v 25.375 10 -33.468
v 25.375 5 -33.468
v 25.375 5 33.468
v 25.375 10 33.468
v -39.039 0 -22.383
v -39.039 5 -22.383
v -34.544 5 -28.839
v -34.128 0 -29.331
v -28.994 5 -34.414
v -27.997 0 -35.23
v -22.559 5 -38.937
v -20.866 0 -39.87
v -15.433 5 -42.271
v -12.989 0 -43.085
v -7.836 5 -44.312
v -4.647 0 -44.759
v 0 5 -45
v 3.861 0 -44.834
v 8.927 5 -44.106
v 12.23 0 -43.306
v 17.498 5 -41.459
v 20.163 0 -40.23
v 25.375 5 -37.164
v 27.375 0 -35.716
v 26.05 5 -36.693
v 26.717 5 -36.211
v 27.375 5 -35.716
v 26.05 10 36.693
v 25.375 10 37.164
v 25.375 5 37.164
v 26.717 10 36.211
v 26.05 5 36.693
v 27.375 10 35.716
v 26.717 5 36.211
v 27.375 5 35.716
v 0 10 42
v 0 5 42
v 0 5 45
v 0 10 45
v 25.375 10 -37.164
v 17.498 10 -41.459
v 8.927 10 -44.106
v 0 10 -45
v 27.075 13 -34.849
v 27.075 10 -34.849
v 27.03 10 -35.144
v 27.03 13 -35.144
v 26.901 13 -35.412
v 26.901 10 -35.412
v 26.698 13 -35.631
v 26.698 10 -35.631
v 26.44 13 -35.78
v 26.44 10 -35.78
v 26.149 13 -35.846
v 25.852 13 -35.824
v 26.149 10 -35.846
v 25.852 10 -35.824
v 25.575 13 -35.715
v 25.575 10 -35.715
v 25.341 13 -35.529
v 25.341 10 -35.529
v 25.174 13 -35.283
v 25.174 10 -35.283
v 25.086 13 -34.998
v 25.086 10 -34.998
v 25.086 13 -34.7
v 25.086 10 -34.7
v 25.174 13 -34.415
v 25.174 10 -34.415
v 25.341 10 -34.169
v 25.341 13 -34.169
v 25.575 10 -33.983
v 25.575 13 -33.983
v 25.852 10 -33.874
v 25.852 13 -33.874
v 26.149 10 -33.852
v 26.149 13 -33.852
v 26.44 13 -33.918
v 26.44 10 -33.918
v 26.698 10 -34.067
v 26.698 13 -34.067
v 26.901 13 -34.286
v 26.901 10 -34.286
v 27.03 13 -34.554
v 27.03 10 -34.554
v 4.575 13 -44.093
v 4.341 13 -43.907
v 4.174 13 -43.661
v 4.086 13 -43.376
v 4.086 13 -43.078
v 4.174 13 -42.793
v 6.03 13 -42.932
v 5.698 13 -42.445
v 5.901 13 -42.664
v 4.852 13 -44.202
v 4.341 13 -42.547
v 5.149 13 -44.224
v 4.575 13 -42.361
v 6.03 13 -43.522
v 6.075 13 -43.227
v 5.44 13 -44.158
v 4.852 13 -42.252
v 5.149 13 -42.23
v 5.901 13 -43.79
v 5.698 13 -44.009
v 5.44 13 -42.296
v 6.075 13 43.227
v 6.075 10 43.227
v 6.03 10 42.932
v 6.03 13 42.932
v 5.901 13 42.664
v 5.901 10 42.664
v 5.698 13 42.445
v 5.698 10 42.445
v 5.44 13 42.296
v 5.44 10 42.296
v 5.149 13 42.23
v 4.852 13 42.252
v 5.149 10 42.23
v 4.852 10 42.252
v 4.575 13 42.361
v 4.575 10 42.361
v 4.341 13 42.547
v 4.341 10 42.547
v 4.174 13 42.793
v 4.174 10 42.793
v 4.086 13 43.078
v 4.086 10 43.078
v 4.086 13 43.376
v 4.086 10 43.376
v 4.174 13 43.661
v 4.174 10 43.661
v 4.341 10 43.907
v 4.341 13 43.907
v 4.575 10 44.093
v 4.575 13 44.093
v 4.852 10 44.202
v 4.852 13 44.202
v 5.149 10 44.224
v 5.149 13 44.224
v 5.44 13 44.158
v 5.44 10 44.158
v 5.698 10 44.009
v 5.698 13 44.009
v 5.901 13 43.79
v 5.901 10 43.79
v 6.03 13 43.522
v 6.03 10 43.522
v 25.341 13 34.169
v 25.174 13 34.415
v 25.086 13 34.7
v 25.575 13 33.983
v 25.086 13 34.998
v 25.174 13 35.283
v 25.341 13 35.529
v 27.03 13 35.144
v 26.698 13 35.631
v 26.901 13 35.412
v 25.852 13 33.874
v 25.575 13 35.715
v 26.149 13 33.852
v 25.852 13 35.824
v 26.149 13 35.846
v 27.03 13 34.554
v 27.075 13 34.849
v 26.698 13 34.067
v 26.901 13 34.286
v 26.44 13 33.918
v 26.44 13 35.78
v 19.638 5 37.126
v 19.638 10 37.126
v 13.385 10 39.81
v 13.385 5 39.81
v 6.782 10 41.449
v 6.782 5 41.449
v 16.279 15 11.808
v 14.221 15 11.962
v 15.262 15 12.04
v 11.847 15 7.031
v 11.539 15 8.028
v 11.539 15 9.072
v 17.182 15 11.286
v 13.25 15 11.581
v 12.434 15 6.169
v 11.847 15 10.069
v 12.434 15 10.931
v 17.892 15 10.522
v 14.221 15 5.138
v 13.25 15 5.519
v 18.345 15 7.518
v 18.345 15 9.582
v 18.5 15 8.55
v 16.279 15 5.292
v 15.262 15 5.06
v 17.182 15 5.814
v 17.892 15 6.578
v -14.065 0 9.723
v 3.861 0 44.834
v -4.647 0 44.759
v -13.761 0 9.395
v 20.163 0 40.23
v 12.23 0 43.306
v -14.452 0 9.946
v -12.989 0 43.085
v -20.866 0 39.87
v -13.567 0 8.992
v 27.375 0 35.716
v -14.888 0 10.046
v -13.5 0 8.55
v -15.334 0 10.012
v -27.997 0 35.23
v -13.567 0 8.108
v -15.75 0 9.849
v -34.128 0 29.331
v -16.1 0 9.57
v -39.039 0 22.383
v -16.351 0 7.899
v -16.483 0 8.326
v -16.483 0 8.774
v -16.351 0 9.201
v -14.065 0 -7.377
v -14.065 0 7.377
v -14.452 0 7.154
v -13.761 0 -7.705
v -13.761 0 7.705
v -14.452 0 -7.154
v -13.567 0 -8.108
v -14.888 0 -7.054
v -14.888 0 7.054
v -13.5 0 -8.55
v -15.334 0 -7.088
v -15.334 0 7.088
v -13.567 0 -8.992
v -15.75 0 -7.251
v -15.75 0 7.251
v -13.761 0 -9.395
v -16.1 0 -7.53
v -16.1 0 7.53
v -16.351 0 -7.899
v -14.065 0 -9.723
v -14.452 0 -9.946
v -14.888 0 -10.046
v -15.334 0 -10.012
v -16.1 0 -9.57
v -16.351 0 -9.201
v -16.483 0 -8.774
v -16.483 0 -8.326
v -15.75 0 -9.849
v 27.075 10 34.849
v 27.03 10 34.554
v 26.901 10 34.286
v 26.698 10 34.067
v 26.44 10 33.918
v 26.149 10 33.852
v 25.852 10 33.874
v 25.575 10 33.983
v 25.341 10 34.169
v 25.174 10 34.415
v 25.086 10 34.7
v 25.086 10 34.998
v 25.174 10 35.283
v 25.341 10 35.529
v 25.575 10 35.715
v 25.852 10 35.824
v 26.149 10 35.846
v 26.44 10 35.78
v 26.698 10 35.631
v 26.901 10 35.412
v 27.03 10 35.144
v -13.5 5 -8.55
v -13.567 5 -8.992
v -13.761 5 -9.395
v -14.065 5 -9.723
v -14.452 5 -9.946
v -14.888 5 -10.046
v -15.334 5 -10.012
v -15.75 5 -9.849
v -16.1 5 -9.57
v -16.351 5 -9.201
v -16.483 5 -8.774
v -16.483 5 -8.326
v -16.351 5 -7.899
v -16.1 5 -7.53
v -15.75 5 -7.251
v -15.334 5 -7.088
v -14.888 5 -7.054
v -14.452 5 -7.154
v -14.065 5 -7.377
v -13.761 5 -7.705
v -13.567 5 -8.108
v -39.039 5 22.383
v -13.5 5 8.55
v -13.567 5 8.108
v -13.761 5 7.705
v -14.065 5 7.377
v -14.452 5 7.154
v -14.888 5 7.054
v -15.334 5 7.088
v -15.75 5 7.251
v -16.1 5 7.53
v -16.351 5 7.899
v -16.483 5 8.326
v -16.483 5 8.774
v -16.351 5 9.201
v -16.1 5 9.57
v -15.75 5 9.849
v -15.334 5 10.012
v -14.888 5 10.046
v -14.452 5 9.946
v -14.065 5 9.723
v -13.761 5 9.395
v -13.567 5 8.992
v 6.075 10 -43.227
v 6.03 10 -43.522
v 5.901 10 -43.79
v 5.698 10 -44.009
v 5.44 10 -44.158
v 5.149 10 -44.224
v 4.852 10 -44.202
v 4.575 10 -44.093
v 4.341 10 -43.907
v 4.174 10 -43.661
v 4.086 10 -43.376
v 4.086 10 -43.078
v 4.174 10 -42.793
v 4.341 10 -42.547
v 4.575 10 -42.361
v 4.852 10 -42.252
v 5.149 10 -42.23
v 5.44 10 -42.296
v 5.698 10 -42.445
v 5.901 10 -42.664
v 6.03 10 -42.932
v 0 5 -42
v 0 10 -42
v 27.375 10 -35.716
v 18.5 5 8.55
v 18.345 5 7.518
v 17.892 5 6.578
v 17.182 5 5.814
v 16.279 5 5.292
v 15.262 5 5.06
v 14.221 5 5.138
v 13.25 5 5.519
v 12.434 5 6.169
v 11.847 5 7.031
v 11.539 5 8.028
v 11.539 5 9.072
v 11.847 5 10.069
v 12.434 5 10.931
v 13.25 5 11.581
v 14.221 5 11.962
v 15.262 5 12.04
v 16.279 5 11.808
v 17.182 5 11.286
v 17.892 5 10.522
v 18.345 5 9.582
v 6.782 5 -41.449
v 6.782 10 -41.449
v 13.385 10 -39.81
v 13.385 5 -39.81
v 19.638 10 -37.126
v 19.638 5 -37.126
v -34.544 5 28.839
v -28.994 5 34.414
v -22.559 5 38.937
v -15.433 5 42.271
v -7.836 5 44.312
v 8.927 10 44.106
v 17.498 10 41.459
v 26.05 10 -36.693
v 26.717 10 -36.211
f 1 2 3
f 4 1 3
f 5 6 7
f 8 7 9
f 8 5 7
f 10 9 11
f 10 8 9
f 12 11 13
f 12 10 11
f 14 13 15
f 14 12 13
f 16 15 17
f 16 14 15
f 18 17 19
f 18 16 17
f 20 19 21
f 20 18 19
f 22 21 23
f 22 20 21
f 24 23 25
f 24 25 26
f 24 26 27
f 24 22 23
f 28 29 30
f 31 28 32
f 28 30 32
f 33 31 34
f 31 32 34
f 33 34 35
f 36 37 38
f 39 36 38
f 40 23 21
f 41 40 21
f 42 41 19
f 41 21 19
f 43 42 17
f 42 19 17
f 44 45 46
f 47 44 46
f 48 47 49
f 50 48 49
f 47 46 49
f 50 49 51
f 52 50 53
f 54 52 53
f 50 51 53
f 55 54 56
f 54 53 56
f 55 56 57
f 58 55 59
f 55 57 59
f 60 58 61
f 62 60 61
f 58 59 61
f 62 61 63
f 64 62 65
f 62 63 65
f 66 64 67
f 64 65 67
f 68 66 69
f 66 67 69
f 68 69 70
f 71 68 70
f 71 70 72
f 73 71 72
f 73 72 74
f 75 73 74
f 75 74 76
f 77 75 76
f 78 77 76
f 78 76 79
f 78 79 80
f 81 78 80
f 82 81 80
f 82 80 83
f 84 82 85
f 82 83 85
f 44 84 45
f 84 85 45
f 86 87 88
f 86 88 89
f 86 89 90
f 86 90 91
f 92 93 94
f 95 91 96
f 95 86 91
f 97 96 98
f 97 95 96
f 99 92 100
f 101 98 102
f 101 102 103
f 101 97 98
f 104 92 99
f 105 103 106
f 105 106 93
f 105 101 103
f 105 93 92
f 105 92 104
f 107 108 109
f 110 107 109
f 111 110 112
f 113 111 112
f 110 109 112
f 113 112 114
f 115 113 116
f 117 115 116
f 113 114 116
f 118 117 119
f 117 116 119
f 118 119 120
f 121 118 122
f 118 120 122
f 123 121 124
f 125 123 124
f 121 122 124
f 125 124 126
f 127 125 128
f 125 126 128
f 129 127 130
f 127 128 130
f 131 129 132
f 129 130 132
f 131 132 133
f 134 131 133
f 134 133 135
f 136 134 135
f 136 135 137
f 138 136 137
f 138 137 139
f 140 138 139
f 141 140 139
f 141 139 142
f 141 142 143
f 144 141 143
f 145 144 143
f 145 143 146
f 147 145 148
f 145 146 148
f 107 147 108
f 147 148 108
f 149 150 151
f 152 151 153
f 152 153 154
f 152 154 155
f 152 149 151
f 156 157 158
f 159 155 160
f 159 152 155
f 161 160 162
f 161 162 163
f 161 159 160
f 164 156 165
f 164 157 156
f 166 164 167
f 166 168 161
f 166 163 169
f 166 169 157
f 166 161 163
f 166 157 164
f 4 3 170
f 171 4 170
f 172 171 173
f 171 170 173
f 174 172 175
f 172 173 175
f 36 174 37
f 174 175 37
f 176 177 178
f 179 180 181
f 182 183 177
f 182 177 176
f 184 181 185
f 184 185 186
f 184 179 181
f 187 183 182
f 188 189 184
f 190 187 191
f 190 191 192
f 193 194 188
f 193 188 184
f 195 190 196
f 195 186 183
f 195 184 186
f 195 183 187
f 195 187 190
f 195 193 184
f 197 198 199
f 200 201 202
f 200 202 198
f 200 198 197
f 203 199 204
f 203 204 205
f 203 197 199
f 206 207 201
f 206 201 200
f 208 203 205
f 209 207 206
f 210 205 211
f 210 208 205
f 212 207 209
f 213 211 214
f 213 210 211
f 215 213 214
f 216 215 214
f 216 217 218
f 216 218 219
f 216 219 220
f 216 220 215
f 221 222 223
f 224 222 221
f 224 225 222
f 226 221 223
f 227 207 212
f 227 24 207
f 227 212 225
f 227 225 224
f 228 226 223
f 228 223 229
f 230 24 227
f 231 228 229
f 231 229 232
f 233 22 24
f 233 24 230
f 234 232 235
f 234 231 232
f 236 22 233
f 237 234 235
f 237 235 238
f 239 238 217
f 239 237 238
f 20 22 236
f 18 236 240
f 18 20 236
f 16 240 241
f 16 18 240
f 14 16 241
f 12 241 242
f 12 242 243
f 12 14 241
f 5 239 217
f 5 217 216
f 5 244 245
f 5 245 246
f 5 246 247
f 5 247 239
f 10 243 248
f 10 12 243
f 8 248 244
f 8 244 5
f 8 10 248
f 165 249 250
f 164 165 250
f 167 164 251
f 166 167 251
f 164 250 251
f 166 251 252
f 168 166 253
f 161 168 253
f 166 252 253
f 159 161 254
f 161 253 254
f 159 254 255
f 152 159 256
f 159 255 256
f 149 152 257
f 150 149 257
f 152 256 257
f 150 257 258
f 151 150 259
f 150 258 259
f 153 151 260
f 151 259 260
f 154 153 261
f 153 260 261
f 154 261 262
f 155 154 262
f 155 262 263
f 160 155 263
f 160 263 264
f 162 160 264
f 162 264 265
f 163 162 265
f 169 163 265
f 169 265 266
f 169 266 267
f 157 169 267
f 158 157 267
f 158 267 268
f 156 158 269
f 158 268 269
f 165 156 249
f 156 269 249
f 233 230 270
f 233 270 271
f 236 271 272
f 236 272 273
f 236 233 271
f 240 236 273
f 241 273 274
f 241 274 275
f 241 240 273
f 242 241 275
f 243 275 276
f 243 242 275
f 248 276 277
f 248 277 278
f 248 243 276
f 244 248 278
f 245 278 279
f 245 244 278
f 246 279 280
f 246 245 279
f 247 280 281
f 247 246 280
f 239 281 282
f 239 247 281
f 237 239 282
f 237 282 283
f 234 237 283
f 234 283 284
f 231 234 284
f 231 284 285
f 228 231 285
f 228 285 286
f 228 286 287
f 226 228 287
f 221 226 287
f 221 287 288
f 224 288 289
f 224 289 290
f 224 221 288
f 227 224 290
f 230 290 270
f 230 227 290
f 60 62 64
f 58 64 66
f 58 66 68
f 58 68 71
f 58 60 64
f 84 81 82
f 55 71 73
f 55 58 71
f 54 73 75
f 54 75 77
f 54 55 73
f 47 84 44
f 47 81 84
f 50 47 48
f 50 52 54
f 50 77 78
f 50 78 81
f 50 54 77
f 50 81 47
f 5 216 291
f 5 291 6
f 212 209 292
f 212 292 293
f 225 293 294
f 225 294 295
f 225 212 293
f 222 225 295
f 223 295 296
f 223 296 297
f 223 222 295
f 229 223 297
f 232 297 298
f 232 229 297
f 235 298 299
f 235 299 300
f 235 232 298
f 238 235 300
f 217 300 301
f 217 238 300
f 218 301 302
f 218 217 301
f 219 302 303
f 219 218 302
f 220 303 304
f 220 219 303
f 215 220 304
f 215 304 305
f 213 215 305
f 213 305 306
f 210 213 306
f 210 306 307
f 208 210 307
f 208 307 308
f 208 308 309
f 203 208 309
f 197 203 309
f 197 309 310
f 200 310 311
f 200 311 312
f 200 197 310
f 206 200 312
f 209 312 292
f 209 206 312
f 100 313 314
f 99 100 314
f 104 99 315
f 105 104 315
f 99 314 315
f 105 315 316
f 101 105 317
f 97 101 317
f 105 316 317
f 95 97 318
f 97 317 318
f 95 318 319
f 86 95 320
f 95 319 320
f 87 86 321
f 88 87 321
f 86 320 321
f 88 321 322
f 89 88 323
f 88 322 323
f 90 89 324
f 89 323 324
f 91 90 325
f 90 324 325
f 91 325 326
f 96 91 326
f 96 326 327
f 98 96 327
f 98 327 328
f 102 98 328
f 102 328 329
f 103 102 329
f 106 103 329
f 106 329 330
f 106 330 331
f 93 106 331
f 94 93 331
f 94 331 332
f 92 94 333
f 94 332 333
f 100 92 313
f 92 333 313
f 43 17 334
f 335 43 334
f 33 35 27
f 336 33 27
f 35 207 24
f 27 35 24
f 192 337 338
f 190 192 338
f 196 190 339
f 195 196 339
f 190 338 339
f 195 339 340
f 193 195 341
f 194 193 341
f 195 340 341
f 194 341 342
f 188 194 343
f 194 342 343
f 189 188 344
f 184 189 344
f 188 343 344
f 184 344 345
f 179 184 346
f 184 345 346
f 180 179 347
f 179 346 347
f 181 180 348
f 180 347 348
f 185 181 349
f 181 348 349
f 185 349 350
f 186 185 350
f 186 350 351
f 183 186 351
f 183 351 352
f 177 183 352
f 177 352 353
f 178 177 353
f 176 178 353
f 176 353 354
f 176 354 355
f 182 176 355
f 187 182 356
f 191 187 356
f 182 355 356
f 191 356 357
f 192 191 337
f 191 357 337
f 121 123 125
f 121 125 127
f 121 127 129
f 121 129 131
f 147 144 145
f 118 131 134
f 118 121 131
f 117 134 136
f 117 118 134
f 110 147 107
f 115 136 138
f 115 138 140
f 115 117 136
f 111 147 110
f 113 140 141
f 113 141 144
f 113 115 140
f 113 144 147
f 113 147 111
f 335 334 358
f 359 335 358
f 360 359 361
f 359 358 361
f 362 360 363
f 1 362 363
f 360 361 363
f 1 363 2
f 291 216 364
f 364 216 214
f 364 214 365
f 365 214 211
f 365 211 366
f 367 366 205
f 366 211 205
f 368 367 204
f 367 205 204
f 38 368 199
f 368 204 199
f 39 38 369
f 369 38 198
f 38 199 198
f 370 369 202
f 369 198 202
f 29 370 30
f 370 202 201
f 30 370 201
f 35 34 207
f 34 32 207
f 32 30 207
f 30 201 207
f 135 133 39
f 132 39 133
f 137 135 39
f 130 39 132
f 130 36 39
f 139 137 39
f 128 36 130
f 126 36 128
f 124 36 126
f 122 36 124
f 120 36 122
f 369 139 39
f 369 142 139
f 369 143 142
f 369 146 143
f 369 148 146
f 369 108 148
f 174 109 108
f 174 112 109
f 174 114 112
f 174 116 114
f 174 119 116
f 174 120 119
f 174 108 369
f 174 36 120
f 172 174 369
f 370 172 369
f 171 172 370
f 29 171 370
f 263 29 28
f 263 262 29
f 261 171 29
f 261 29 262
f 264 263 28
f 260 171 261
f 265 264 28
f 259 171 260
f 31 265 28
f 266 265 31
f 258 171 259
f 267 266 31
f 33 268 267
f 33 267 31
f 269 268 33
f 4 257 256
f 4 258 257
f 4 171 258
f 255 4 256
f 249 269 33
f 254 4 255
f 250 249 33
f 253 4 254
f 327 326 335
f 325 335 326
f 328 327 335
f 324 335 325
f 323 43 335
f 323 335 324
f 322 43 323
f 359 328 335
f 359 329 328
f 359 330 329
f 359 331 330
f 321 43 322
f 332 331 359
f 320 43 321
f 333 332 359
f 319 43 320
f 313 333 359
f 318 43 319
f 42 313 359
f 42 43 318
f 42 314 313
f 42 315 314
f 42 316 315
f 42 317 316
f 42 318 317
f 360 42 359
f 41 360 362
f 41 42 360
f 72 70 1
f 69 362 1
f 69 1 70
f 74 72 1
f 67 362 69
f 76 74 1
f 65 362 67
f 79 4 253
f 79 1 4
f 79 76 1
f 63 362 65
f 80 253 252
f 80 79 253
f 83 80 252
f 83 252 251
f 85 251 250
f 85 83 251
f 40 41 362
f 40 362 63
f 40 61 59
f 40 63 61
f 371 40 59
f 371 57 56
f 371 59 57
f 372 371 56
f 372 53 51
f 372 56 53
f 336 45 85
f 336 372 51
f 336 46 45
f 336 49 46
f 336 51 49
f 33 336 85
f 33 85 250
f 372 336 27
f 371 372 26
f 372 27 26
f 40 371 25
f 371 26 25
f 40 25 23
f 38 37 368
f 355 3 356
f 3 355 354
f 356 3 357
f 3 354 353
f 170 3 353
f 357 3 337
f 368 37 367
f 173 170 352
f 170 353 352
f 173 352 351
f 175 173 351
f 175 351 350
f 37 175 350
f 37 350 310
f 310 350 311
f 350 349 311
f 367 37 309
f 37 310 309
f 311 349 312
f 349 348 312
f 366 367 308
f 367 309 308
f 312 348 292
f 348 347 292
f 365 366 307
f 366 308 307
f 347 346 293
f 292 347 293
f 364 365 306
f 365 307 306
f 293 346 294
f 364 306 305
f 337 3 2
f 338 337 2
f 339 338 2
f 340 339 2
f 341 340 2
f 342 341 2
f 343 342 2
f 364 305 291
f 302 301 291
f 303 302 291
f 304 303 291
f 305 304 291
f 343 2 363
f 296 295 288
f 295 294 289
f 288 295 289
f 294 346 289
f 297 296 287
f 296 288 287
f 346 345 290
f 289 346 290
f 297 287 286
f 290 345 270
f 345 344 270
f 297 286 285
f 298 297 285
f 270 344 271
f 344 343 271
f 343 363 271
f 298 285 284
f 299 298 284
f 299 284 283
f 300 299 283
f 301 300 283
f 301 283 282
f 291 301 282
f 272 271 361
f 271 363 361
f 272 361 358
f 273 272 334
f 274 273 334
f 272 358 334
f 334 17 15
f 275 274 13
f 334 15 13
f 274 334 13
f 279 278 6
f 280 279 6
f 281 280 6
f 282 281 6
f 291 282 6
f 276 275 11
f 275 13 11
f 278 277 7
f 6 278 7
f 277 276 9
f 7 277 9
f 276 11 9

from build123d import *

# Parameters (mm, degrees)
SKETCH_1_R      = 1.5
EXTRUDE_1_DEPTH = 5
SKETCH_2_R      = 3.5
EXTRUDE_2_DEPTH = 10
EXTRUDE_3_DEPTH = 5
SKETCH_4_R      = 1
EXTRUDE_4_DEPTH = 3


with BuildPart() as part:
    # 草图1 → 凸台-拉伸1 (new body)
    with BuildSketch(Plane(origin=(0, 0, 0), x_dir=(1, 0, 0), z_dir=(0, 1, 0))):
        with BuildLine():
            Line((-39.038561358, -22.382822144), (-39.038561358, 22.382822144))
            ThreePointArc((-39.038561358, 22.382822144), (-8.857541047, 44.119655105), (27.374530931, 35.716033603))
            Line((27.374530931, 35.716033603), (27.374530931, -35.716033603))
            ThreePointArc((27.374530931, -35.716033603), (-8.857541047, -44.119655105), (-39.038561358, -22.382822144))
        make_face()
        with Locations((-15, 8.55)):
            Circle(SKETCH_1_R, mode=Mode.SUBTRACT)
        with Locations((-15, -8.55)):
            Circle(SKETCH_1_R, mode=Mode.SUBTRACT)
    extrude(amount=EXTRUDE_1_DEPTH)

    # 草图2 → 凸台-拉伸2 (add)
    with BuildSketch(Plane(origin=(0, 5, 0), x_dir=(1, 0, 0), z_dir=(0, 1, 0))):
        with Locations((15, -8.55)):
            Circle(SKETCH_2_R)
    extrude(amount=EXTRUDE_2_DEPTH)

    # 草图3 → 凸台-拉伸3 (add)
    with BuildSketch(Plane(origin=(0, 5, 0), x_dir=(1, 0, 0), z_dir=(0, 1, 0))):
        with BuildLine():
            ThreePointArc((0, -45), (13.278516311, -42.996290591), (25.374530931, -37.163600203))
            Line((25.374530931, -37.163600203), (25.374530931, -33.46839076))
            ThreePointArc((25.374530931, -33.46839076), (13.385208031, -39.810001331), (0, -42))
            Line((0, -42), (0, -45))
        make_face()
        with BuildLine():
            Line((25.374530931, -33.46839076), (25.374530931, -37.163600203))
            ThreePointArc((25.374530931, -37.163600203), (26.384460277, -36.453535575), (27.374530931, -35.716033603))
            Line((27.374530931, -35.716033603), (27.374530931, -31.853336659))
            ThreePointArc((27.374530931, -31.853336659), (26.386890339, -32.676168965), (25.374530931, -33.46839076))
        make_face()
        with BuildLine():
            Line((25.374530931, 33.46839076), (25.374530931, -33.46839076))
            ThreePointArc((25.374530931, -33.46839076), (26.386890339, -32.676168965), (27.374530931, -31.853336659))
            Line((27.374530931, -31.853336659), (27.374530931, 31.853336659))
            ThreePointArc((27.374530931, 31.853336659), (26.386890339, 32.676168965), (25.374530931, 33.46839076))
        make_face()
        with BuildLine():
            Line((25.374530931, 37.163600203), (25.374530931, 33.46839076))
            ThreePointArc((25.374530931, 33.46839076), (26.386890339, 32.676168965), (27.374530931, 31.853336659))
            Line((27.374530931, 31.853336659), (27.374530931, 35.716033603))
            ThreePointArc((27.374530931, 35.716033603), (26.384460277, 36.453535575), (25.374530931, 37.163600203))
        make_face()
        with BuildLine():
            ThreePointArc((0, 42), (13.385208031, 39.810001331), (25.374530931, 33.46839076))
            Line((25.374530931, 33.46839076), (25.374530931, 37.163600203))
            ThreePointArc((25.374530931, 37.163600203), (13.278516311, 42.996290591), (0, 45))
            Line((0, 45), (0, 42))
        make_face()
    extrude(amount=EXTRUDE_3_DEPTH)

    # 草图4 → 凸台-拉伸4 (add)
    with BuildSketch(Plane(origin=(0, 10, 0), x_dir=(1, 0, 0), z_dir=(0, 1, 0))):
        with Locations((26.074530931, -34.848835383)):
            Circle(SKETCH_4_R)
        with Locations((5.074530931, -43.226977996)):
            Circle(SKETCH_4_R)
        with Locations((26.074530931, 34.848835383)):
            Circle(SKETCH_4_R)
        with Locations((5.074530931, 43.226977996)):
            Circle(SKETCH_4_R)
    extrude(amount=EXTRUDE_4_DEPTH)


solid = part.part
